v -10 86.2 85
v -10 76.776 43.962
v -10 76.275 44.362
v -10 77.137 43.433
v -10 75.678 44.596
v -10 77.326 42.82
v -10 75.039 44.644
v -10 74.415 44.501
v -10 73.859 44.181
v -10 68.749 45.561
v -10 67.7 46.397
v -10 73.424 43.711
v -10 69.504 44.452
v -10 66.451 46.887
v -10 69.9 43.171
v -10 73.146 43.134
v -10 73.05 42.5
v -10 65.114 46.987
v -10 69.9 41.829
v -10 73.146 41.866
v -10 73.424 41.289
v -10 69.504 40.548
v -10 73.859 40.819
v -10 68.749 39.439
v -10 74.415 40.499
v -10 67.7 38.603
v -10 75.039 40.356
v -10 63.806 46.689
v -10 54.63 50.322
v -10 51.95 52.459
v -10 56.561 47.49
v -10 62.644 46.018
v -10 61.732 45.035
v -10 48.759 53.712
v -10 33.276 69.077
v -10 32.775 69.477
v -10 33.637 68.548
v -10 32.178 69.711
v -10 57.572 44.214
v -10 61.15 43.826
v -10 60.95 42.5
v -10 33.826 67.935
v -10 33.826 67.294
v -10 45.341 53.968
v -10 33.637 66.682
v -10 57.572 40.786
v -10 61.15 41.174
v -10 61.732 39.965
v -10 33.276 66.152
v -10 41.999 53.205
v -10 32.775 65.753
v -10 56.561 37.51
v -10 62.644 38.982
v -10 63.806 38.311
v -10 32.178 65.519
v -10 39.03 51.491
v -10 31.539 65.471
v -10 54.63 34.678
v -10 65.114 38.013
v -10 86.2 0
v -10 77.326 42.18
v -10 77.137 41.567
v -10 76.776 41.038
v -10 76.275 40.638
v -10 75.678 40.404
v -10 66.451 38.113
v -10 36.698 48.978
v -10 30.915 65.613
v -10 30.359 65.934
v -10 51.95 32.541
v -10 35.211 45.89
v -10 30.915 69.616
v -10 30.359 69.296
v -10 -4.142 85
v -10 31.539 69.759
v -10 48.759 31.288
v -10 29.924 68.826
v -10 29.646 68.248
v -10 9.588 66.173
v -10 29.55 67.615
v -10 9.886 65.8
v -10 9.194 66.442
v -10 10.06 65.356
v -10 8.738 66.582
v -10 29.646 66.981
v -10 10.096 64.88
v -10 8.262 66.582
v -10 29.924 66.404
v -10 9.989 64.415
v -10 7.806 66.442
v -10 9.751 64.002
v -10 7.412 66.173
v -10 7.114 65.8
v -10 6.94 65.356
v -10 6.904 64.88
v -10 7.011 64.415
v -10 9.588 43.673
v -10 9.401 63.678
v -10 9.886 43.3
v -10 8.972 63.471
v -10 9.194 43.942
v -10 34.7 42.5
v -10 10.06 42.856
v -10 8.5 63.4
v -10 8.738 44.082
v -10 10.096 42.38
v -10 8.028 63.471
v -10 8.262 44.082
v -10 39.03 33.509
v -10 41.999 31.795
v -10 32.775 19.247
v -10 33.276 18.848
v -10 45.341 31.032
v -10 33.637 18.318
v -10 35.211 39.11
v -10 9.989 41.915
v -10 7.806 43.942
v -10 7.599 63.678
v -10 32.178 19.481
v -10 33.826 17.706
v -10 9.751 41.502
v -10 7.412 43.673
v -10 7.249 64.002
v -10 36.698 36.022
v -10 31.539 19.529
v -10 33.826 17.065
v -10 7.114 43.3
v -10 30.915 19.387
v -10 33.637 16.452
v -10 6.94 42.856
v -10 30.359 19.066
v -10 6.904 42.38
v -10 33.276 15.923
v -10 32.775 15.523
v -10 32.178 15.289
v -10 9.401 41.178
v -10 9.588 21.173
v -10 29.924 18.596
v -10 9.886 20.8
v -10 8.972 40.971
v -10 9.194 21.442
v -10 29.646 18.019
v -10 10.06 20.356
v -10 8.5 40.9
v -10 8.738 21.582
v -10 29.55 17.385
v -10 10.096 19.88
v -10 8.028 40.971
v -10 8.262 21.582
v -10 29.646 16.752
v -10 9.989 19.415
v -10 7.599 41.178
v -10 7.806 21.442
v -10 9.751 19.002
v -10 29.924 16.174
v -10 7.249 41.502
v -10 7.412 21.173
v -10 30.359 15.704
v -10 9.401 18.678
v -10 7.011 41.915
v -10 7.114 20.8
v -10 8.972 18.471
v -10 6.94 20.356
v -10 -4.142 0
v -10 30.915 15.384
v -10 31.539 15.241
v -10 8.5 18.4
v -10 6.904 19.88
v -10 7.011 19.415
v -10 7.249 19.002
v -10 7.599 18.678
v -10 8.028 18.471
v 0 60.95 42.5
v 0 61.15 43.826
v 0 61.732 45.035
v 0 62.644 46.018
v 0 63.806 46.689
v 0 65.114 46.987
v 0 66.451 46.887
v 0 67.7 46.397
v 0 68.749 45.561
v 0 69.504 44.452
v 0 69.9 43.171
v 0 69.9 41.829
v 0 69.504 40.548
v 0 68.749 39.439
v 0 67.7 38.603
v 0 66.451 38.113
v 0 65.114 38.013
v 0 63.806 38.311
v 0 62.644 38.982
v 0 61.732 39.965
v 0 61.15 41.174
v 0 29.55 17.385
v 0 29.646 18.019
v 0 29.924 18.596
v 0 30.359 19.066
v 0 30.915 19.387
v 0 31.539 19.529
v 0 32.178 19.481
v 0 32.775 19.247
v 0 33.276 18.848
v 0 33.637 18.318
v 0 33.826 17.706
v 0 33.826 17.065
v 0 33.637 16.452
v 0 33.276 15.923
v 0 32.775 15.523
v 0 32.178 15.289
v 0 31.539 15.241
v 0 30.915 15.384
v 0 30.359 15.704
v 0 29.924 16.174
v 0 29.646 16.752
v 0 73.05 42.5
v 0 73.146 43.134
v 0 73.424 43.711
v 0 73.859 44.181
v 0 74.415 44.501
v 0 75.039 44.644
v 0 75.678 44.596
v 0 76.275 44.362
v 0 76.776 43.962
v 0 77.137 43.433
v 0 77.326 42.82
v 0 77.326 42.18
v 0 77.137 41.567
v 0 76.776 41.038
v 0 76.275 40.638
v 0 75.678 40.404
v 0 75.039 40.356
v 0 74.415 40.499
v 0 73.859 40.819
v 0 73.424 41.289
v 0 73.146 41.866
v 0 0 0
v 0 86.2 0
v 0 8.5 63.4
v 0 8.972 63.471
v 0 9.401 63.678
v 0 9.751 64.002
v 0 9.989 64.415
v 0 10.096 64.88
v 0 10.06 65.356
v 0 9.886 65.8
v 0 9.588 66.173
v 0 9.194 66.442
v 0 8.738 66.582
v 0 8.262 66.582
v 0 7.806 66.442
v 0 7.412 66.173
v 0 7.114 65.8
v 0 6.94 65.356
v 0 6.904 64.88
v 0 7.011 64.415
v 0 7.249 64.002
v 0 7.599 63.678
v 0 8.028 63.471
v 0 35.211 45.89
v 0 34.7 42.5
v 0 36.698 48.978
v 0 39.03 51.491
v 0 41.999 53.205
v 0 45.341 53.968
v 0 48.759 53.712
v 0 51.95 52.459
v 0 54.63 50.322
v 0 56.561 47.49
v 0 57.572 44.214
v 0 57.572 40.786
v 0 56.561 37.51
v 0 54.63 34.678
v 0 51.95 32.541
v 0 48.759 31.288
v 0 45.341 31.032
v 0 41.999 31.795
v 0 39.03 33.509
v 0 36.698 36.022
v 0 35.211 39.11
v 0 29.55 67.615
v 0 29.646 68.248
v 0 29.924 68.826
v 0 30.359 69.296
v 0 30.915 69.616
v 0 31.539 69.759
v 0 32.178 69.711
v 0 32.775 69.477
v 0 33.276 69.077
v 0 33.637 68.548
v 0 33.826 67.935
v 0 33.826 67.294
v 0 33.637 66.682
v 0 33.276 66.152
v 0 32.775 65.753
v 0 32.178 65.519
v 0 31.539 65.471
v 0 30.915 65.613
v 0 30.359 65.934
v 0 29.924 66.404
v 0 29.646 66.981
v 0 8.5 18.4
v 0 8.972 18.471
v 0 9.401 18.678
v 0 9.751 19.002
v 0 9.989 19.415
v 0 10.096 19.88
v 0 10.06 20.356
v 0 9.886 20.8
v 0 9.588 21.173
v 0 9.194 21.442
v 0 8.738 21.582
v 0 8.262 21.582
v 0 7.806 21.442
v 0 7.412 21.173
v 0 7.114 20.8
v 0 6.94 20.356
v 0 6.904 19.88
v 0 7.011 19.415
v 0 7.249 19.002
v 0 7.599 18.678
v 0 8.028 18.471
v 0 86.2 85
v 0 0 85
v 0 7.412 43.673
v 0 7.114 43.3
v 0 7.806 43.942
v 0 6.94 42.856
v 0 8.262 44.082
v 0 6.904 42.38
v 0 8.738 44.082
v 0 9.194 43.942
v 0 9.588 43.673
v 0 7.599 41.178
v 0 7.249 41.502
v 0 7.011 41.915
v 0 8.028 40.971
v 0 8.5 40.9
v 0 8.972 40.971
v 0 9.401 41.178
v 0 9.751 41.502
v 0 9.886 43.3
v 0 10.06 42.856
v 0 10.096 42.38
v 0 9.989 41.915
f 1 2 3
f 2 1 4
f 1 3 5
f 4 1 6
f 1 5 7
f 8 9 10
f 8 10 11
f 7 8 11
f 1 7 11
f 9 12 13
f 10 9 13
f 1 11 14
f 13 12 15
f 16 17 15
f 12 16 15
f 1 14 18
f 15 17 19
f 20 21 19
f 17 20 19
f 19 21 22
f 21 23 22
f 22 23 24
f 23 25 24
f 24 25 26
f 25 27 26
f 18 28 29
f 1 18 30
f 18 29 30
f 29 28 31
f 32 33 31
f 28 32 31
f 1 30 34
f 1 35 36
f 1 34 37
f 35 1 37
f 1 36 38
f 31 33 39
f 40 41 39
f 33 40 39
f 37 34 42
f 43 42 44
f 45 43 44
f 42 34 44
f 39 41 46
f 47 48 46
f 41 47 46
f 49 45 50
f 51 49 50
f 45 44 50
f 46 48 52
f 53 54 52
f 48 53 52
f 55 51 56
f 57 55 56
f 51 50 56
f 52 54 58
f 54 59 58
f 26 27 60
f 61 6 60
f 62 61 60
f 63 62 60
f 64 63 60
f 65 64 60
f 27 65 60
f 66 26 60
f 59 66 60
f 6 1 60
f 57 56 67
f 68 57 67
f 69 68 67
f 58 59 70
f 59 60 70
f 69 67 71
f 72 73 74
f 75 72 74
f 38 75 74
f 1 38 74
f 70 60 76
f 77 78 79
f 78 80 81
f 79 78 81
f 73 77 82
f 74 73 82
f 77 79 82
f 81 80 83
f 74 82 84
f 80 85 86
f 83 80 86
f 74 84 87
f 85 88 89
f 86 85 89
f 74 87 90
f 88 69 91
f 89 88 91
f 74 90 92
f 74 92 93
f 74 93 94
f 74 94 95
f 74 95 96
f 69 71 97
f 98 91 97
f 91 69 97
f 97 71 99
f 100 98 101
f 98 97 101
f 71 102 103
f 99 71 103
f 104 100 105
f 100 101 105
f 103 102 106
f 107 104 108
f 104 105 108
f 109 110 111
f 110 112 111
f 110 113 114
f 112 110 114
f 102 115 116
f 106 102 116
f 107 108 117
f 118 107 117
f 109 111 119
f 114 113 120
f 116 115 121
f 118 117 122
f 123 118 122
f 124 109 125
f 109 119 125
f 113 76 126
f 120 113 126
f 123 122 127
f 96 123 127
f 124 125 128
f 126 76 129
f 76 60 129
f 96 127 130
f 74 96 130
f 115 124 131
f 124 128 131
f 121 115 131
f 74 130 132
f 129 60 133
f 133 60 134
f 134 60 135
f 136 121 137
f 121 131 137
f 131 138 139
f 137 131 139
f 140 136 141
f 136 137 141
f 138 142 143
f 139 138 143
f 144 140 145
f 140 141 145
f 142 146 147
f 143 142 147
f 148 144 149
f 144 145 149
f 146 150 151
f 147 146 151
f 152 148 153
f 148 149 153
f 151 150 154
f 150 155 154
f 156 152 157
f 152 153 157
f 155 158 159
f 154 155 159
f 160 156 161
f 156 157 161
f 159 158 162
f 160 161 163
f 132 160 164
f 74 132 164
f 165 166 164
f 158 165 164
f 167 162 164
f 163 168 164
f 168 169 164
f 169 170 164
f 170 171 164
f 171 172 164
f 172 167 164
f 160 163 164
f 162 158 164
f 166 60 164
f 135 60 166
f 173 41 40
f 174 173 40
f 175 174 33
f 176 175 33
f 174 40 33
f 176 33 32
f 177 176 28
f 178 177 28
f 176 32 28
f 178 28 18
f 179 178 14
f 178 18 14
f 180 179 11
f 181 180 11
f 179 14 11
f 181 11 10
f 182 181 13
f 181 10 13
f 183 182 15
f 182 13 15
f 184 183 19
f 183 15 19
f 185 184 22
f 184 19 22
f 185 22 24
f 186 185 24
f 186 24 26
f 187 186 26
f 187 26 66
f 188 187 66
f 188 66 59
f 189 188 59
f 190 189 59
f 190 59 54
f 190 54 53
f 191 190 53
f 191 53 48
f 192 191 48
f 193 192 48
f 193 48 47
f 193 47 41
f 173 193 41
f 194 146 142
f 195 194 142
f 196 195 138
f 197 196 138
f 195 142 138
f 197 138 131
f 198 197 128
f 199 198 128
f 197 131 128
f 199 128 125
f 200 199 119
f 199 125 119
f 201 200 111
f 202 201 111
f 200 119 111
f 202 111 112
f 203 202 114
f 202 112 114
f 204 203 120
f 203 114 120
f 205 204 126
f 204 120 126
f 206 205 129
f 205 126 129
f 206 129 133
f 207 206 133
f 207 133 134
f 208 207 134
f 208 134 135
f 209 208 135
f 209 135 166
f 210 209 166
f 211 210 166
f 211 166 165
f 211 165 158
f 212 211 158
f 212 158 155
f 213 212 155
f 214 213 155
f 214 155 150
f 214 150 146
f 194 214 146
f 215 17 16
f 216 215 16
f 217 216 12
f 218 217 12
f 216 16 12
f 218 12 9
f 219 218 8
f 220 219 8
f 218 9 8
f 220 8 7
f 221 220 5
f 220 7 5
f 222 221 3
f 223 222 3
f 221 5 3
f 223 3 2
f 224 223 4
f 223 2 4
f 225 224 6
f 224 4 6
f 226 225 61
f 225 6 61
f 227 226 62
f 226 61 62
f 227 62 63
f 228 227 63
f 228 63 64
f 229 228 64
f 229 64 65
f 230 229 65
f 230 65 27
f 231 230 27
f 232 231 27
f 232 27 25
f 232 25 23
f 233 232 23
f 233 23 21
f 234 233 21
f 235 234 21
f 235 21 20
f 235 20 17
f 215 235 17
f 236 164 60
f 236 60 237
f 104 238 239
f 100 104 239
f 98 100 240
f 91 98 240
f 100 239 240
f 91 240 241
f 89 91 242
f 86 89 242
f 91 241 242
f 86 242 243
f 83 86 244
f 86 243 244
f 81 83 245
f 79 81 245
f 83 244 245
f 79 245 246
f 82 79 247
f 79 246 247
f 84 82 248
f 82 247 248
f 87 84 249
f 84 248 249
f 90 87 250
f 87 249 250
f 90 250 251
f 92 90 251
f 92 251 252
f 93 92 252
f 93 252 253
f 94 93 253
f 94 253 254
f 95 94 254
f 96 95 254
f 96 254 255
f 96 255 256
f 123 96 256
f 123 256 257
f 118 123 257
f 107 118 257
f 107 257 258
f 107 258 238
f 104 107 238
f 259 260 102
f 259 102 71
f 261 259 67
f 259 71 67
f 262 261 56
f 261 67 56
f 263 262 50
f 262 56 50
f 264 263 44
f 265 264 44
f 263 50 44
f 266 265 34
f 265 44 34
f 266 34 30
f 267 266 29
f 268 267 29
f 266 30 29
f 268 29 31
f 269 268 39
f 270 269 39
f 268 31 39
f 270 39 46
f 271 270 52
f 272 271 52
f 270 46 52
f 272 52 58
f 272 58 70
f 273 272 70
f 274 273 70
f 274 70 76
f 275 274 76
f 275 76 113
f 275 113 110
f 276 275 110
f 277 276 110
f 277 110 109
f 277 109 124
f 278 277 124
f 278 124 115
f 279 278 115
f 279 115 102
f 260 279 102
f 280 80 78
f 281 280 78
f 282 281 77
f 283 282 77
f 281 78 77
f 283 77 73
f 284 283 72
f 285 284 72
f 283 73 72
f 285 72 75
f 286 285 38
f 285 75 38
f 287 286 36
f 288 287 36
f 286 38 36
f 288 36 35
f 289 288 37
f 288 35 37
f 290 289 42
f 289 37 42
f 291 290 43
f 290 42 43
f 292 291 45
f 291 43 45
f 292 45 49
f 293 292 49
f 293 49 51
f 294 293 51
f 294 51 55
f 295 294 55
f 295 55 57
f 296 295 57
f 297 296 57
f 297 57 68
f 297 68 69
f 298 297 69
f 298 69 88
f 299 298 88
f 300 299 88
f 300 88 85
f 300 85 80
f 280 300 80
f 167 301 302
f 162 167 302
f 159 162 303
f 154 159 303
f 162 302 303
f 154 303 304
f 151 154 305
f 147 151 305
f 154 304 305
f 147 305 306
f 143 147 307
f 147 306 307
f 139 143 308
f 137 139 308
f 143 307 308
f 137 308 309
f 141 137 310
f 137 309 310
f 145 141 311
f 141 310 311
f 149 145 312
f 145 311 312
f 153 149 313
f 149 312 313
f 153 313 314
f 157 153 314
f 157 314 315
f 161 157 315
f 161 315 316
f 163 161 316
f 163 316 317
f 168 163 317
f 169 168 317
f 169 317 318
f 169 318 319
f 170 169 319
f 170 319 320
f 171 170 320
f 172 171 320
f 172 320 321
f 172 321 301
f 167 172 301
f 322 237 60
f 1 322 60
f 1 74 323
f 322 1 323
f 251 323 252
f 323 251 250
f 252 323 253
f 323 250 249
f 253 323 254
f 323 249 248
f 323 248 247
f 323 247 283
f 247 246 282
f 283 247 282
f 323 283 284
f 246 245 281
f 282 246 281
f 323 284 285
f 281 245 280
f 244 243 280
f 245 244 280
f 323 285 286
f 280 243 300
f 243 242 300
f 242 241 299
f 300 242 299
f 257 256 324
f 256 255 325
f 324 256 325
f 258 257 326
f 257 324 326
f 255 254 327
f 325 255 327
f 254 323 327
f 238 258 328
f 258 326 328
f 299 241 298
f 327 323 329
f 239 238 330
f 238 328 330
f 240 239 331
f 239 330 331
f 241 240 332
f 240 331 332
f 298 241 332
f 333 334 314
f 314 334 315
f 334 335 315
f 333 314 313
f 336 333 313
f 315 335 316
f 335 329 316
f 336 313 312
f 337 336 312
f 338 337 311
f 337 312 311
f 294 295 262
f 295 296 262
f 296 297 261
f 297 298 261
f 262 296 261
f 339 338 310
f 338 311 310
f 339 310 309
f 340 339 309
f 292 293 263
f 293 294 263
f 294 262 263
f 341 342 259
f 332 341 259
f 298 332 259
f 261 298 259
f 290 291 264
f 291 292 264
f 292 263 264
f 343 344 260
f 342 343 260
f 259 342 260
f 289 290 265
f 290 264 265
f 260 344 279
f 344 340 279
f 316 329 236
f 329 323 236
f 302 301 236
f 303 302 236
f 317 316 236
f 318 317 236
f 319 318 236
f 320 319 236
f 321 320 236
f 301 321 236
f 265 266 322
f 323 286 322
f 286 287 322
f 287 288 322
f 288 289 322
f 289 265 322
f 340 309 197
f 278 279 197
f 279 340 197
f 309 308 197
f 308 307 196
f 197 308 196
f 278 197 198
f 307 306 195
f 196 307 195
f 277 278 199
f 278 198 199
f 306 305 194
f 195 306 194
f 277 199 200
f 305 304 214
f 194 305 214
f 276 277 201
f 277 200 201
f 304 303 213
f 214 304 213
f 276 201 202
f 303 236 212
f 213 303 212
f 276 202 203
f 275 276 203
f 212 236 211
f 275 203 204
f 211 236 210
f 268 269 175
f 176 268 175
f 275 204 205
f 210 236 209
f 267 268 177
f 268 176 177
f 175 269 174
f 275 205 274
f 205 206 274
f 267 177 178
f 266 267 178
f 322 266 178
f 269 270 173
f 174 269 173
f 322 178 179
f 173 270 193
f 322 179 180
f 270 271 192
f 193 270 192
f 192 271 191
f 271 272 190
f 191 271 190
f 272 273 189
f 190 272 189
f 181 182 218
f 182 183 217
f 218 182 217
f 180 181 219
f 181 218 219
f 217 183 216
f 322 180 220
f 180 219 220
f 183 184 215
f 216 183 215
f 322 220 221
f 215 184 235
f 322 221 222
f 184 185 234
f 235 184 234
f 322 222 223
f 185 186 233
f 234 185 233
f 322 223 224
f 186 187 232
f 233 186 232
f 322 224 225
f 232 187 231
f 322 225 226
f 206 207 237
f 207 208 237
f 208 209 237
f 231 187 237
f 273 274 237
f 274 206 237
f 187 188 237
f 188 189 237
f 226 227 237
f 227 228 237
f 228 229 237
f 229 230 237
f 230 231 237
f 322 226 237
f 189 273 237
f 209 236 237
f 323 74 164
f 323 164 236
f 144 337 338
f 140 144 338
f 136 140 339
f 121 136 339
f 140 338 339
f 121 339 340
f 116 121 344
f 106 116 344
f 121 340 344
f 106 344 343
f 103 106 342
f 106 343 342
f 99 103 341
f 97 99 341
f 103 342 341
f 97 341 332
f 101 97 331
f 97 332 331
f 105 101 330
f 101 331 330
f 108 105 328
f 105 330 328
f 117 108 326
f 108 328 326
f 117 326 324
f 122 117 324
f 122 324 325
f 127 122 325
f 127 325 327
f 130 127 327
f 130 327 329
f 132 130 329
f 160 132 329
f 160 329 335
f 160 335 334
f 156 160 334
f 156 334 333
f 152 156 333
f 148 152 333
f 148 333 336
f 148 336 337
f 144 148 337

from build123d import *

# Parameters (mm, degrees)
BOSS_EXTRUDE1_DEPTH = 85
SKETCH3_R           = 11.5
SKETCH3_R_2         = 4.5
SKETCH3_R_3         = 2.15
CUT_EXTRUDE1_DEPTH  = 85
SKETCH4_R           = 1.6
CUT_EXTRUDE2_DEPTH  = 85


with BuildPart() as part:
    # Sketch2 → Boss-Extrude1 (new body)
    with BuildSketch(Plane.XY):
        Polygon((0, 0), (0, 86.2), (-10, 86.2), (-10, -4.142135624), align=None)
    extrude(amount=BOSS_EXTRUDE1_DEPTH)

    # Sketch3 → Cut-Extrude1 (cut)
    with BuildSketch(Plane.ZY.offset(10)):
        with Locations(Location((42.5, 46.2, 0), (0, 0, 270))):
            Circle(SKETCH3_R)
        with Locations(Location((42.5, 65.45, 0), (0, 0, 270))):
            Circle(SKETCH3_R_2)
        with Locations(Location((42.5, 75.2, 0), (0, 0, 270))):
            Circle(SKETCH3_R_3)
        with Locations(Location((67.61473671, 31.7, 0), (0, 0, 270))):
            Circle(SKETCH3_R_3)
        with Locations(Location((17.38526329, 31.7, 0), (0, 0, 270))):
            Circle(SKETCH3_R_3)
    extrude(amount=-CUT_EXTRUDE1_DEPTH, mode=Mode.SUBTRACT)

    # Sketch4 → Cut-Extrude2 (cut)
    with BuildSketch(Plane(origin=(0, 0, 0), x_dir=(0, 0, -1), z_dir=(1, 0, 0))):
        with Locations((-65, 8.5)):
            Circle(SKETCH4_R)
        with Locations((-20, 8.5)):
            Circle(SKETCH4_R)
        with Locations((-42.5, 8.5)):
            Circle(SKETCH4_R)
    extrude(amount=-CUT_EXTRUDE2_DEPTH, mode=Mode.SUBTRACT)


solid = part.part
